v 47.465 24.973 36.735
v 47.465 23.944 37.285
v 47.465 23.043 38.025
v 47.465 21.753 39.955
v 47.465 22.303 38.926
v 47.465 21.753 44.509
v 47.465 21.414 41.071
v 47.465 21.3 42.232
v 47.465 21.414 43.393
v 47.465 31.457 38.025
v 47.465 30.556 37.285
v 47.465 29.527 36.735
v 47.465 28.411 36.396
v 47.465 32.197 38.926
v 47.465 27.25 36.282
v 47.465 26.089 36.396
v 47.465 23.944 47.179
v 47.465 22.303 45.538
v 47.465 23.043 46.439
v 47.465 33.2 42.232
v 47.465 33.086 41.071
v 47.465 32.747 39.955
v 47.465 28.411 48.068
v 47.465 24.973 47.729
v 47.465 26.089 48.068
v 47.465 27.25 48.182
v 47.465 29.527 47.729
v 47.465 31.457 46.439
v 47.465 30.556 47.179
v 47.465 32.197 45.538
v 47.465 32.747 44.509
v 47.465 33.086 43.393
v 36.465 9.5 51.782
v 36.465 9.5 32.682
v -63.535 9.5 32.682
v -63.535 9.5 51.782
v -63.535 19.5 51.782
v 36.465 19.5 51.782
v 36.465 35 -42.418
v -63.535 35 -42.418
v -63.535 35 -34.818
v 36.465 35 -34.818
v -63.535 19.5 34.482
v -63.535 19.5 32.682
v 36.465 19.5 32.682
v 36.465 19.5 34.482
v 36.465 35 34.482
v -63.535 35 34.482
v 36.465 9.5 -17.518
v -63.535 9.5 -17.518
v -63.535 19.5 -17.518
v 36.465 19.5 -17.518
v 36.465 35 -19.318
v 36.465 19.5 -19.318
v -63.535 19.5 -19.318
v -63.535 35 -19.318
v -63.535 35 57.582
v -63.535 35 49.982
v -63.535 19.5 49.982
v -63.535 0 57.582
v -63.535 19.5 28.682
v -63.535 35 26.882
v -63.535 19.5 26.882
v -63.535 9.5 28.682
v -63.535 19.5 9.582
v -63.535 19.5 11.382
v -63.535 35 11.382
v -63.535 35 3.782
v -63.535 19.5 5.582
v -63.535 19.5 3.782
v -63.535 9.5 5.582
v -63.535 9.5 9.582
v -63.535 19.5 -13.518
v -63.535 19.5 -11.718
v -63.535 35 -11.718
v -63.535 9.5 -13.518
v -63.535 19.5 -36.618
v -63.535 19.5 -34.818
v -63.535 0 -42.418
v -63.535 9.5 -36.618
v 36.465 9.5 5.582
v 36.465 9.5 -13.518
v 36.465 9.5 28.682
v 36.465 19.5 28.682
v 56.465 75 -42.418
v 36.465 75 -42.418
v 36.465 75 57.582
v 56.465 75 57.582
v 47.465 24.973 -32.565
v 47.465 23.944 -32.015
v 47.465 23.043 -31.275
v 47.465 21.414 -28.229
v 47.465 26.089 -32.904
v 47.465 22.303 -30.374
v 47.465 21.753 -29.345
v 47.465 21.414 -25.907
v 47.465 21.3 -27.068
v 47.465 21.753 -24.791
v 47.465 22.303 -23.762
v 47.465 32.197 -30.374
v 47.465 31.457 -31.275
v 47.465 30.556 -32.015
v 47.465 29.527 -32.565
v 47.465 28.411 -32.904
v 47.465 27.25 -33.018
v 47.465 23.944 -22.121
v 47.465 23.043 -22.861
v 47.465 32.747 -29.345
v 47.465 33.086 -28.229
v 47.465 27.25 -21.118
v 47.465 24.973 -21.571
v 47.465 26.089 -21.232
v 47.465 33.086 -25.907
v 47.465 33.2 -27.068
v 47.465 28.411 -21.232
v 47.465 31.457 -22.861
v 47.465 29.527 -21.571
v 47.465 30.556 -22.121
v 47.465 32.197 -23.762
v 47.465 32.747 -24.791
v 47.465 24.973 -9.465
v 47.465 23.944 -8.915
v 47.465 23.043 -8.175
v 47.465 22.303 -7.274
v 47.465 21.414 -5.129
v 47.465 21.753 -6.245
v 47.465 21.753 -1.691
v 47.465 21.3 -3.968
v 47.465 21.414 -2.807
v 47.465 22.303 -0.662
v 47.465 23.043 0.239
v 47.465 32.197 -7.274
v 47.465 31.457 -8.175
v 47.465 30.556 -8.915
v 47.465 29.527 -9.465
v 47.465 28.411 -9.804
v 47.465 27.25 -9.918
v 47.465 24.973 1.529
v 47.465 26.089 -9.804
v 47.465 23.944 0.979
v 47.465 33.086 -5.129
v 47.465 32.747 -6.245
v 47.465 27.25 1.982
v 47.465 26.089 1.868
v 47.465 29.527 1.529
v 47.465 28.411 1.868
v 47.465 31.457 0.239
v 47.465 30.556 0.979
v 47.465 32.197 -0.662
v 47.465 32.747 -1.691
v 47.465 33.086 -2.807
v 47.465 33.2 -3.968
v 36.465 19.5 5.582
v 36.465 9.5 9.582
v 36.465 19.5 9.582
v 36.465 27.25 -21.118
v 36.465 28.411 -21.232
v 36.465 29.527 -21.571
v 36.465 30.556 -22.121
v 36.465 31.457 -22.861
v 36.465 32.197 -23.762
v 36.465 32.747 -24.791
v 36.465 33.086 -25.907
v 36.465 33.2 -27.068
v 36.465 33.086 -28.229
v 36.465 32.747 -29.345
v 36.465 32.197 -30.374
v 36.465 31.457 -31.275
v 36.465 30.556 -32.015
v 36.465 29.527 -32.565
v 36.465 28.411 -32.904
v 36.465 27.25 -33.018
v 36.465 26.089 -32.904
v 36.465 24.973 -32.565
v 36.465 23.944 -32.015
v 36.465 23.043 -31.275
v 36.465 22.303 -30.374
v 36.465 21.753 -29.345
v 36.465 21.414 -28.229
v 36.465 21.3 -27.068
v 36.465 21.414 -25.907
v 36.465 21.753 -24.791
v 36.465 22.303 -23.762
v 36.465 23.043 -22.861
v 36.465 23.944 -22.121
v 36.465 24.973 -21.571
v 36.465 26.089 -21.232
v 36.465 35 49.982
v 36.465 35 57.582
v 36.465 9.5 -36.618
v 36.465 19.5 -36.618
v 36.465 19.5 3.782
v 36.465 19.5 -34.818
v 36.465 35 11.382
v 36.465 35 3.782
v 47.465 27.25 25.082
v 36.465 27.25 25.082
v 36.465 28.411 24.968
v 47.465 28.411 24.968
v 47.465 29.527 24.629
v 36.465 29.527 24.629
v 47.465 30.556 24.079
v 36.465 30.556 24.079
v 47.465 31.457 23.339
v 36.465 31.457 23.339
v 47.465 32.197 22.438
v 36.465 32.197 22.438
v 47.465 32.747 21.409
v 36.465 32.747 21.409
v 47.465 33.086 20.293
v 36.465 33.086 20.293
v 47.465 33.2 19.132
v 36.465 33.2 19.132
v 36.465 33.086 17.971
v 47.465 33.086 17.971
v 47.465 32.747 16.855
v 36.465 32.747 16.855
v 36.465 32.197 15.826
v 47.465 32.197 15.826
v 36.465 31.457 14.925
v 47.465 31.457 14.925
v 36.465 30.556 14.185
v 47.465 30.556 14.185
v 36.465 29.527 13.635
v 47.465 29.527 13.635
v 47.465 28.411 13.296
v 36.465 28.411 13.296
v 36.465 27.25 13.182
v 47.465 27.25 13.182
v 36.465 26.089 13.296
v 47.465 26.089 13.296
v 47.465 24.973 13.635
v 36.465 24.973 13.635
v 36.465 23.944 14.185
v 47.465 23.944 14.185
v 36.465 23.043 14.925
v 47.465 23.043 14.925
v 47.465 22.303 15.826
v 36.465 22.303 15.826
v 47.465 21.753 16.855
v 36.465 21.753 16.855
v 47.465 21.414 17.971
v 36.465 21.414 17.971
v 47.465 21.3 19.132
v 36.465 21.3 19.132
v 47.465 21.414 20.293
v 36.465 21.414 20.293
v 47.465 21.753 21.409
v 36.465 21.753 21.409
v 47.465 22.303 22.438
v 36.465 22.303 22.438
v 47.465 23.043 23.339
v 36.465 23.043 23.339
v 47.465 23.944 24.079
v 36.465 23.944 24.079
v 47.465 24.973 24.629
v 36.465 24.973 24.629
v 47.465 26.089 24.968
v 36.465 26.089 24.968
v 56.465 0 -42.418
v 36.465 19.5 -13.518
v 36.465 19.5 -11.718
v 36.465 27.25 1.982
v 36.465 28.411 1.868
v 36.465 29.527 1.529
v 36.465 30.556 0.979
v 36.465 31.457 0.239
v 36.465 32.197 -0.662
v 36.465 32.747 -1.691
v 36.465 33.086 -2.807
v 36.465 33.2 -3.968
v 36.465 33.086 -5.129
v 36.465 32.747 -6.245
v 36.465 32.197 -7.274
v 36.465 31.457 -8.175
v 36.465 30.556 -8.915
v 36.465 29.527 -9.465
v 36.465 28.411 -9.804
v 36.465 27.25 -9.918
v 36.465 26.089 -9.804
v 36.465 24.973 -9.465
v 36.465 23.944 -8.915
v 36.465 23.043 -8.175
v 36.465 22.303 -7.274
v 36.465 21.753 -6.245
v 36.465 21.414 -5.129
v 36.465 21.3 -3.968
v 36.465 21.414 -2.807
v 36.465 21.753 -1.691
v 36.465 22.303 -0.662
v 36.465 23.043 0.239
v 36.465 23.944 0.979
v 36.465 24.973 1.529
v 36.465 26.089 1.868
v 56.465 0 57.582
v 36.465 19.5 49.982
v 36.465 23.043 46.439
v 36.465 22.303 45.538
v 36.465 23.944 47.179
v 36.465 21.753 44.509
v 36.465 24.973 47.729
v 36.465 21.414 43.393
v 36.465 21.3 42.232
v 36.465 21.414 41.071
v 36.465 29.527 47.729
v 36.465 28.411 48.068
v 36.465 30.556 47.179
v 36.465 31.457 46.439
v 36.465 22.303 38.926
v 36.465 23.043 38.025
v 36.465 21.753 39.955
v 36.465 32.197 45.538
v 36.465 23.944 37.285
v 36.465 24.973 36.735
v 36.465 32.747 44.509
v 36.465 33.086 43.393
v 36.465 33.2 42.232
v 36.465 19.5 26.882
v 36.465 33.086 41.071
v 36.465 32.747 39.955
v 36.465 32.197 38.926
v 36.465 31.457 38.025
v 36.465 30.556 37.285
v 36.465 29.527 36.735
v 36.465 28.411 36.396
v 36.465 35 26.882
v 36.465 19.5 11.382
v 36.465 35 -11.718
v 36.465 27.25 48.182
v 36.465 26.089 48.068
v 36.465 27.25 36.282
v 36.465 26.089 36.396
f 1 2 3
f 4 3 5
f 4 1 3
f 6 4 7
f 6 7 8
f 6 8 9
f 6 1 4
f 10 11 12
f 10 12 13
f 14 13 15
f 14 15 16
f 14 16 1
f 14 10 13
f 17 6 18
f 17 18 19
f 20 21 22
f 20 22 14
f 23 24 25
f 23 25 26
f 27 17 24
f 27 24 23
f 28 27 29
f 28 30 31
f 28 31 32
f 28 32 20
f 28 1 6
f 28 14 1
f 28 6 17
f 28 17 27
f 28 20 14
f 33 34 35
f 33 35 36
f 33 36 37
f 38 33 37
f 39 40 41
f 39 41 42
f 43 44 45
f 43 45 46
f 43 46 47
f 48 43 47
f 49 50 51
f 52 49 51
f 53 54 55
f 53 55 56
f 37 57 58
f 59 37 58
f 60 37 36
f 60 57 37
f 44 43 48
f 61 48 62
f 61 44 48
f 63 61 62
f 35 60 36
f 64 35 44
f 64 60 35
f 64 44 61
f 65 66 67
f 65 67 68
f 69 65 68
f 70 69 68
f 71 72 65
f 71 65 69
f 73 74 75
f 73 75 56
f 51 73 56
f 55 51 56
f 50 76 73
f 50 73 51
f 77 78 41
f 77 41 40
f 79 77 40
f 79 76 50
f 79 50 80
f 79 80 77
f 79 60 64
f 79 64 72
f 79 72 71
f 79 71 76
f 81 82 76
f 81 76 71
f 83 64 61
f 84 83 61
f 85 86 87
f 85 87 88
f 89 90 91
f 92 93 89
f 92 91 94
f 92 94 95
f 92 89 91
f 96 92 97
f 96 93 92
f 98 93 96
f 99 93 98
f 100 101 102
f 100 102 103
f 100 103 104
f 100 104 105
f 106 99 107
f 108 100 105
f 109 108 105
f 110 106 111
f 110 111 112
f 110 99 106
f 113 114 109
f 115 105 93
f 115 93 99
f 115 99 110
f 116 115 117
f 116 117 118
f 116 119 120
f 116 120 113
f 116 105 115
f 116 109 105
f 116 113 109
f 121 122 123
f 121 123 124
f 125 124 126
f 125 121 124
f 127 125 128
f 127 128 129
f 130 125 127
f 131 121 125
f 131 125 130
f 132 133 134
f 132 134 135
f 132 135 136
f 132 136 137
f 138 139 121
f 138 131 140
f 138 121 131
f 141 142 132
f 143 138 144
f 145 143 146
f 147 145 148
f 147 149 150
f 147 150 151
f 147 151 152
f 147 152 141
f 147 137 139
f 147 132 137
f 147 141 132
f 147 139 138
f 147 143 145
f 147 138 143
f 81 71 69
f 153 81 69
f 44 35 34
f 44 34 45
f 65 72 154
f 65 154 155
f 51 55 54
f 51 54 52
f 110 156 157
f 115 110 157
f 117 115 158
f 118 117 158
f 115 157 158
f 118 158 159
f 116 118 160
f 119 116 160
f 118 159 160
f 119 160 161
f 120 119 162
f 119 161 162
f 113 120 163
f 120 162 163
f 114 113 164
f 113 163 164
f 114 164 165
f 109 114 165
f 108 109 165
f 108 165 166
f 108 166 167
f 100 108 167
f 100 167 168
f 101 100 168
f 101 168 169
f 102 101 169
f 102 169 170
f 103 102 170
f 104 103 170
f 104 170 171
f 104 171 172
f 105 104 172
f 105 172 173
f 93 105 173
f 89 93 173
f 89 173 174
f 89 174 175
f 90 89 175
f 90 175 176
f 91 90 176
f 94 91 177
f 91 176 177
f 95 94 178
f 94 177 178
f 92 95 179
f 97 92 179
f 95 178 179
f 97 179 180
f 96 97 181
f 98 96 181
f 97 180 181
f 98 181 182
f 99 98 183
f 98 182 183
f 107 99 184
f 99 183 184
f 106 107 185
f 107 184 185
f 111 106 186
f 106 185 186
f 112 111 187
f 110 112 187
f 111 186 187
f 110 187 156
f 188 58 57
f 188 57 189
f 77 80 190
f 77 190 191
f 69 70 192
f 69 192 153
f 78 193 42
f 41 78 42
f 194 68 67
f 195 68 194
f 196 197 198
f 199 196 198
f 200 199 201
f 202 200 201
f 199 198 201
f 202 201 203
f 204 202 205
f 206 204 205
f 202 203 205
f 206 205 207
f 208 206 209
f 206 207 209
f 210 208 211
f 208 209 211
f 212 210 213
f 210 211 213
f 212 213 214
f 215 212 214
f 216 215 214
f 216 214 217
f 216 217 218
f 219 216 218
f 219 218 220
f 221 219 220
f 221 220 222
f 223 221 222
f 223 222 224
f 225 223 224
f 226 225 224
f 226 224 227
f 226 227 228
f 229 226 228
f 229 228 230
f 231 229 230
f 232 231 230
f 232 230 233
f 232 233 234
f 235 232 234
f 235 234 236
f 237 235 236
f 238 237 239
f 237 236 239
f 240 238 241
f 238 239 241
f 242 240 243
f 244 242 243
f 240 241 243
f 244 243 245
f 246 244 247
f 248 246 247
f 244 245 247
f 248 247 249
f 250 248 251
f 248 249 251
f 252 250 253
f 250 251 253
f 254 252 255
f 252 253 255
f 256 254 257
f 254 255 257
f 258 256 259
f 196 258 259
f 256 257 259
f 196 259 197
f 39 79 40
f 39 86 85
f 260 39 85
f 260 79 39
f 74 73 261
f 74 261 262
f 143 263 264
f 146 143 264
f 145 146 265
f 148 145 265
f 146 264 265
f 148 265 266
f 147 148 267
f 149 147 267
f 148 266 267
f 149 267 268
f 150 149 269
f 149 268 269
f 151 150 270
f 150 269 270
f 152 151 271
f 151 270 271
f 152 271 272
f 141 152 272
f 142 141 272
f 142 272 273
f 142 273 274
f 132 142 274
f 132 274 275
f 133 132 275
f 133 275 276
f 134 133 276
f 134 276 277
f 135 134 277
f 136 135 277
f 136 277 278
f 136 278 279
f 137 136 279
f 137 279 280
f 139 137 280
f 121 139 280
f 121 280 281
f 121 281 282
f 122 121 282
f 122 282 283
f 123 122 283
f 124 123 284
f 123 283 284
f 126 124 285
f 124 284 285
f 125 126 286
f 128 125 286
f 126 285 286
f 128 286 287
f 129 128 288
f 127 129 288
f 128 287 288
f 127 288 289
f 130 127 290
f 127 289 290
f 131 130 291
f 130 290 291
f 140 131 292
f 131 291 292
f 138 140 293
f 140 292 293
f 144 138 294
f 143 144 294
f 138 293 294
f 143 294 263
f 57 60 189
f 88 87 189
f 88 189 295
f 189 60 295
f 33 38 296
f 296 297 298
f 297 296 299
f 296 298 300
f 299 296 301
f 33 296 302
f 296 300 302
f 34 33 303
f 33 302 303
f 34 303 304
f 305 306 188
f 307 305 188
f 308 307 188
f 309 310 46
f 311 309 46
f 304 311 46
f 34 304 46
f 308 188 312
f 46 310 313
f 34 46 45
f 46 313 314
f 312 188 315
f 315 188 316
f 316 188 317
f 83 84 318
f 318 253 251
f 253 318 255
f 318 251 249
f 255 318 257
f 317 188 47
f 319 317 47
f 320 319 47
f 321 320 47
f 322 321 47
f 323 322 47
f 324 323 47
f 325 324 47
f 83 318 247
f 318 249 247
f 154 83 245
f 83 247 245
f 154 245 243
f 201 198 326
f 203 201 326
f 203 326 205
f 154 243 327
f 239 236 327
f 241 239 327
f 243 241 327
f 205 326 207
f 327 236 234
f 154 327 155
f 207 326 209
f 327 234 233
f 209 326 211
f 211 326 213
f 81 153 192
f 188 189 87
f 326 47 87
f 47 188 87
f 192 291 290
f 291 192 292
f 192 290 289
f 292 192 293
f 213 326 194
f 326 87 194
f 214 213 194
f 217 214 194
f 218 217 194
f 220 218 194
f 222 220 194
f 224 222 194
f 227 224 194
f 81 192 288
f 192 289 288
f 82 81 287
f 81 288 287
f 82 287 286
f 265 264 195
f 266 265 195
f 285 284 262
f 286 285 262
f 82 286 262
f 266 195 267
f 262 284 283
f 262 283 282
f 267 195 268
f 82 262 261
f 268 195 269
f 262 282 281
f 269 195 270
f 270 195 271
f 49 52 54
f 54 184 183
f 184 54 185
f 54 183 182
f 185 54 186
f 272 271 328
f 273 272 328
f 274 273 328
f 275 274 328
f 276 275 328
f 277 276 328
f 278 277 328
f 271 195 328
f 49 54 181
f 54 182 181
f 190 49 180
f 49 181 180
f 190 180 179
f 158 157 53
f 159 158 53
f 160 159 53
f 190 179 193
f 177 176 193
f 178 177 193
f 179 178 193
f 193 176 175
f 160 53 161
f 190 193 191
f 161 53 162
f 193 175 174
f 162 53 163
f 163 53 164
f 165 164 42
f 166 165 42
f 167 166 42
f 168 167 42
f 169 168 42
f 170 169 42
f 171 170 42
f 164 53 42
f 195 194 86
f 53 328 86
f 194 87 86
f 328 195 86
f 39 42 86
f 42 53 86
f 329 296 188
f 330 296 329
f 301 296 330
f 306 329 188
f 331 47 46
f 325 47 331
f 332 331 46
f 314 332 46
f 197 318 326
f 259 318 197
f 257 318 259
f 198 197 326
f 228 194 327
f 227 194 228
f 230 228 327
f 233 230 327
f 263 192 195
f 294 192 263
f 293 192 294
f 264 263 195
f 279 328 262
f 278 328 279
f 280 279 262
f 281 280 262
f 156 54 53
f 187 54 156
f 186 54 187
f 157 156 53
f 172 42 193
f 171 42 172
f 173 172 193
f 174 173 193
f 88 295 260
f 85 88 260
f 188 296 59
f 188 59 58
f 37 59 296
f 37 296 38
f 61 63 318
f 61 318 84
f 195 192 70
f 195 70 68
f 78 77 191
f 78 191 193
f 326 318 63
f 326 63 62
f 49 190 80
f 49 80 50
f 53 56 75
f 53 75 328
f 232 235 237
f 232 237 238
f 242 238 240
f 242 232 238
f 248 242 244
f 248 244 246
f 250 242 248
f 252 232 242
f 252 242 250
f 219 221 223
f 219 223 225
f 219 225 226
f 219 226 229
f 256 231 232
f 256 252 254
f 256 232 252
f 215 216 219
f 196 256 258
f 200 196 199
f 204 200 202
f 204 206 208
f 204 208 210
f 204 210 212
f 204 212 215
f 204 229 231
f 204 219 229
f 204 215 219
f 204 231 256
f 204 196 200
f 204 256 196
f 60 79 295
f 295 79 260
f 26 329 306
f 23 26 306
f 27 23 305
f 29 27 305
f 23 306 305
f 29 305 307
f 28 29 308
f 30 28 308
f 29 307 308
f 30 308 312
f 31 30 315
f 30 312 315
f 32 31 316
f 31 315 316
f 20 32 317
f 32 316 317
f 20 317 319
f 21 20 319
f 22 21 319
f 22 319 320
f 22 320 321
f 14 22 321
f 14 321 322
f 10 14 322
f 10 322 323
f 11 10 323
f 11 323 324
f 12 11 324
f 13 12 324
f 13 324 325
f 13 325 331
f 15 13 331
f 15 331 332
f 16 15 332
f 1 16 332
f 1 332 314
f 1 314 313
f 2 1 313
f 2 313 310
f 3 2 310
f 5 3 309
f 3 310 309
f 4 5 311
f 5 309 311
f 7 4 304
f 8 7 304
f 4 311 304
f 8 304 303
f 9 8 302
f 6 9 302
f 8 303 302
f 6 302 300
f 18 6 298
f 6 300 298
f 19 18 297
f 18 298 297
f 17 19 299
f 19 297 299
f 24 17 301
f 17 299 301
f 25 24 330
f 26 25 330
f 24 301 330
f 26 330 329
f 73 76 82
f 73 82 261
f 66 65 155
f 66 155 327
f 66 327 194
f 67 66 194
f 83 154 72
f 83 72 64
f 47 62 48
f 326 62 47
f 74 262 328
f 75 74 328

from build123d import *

# Parameters (mm, degrees)
SKETCH1_W           = 120
SKETCH1_H           = 100
BOSS_EXTRUDE1_DEPTH = 75
SKETCH2_W           = 100
SKETCH2_H           = 100
CUT_EXTRUDE1_DEPTH  = 40
SKETCH6_W           = 15.5
SKETCH6_H           = 15.5
CUT_EXTRUDE4_DEPTH  = 100
SKETCH8_W           = 19.1
SKETCH8_H           = 10
CUT_EXTRUDE5_DEPTH  = 100
SKETCH6_3_R         = 5.95
CUT_EXTRUDE6_DEPTH  = 111


with BuildPart() as part:
    # Sketch1 → Boss-Extrude1 (new body)
    with BuildSketch(Plane(origin=(0, 0, 0), x_dir=(1, 0, 0), z_dir=(0, 1, 0))):
        with Locations((-3.53539823, -7.581858407)):
            Rectangle(SKETCH1_W, SKETCH1_H)
    extrude(amount=BOSS_EXTRUDE1_DEPTH)

    # Sketch2 → Cut-Extrude1 (cut)
    with BuildSketch(Plane(origin=(0, 75, 0), x_dir=(1, 0, 0), z_dir=(0, 1, 0))):
        with Locations((-13.53539823, -7.581858407)):
            Rectangle(SKETCH2_W, SKETCH2_H)
    extrude(amount=-CUT_EXTRUDE1_DEPTH, mode=Mode.SUBTRACT)

    # Sketch6 → Cut-Extrude4 (cut)
    with BuildSketch(Plane.ZY.offset(63.53539823)):
        with Locations((-27.068141593, 27.25)):
            Rectangle(SKETCH6_W, SKETCH6_H)
        with Locations((-3.968141593, 27.25)):
            Rectangle(SKETCH6_W, SKETCH6_H)
        with Locations((19.131858407, 27.25)):
            Rectangle(SKETCH6_W, SKETCH6_H)
        with Locations((42.231858407, 27.25)):
            Rectangle(SKETCH6_W, SKETCH6_H)
    extrude(amount=-CUT_EXTRUDE4_DEPTH, mode=Mode.SUBTRACT)

    # Sketch8 → Cut-Extrude5 (cut)
    with BuildSketch(Plane.ZY.offset(63.53539823)):
        with Locations((-27.068141593, 14.5)):
            Rectangle(SKETCH8_W, SKETCH8_H)
        with Locations((-3.968141593, 14.5)):
            Rectangle(SKETCH8_W, SKETCH8_H)
        with Locations((42.231858407, 14.5)):
            Rectangle(SKETCH8_W, SKETCH8_H)
        with Locations((19.131858407, 14.5)):
            Rectangle(SKETCH8_W, SKETCH8_H)
    extrude(amount=-CUT_EXTRUDE5_DEPTH, mode=Mode.SUBTRACT)

    # Sketch6<3> → Cut-Extrude6 (cut)
    with BuildSketch(Plane.ZY.offset(63.53539823)):
        with Locations((-27.068141593, 27.25)):
            Circle(SKETCH6_3_R)
        with Locations((-3.968141593, 27.25)):
            Circle(SKETCH6_3_R)
        with Locations((42.231858407, 27.25)):
            Circle(SKETCH6_3_R)
        with Locations((19.131858407, 27.25)):
            Circle(SKETCH6_3_R)
    extrude(amount=-CUT_EXTRUDE6_DEPTH, mode=Mode.SUBTRACT)


solid = part.part
